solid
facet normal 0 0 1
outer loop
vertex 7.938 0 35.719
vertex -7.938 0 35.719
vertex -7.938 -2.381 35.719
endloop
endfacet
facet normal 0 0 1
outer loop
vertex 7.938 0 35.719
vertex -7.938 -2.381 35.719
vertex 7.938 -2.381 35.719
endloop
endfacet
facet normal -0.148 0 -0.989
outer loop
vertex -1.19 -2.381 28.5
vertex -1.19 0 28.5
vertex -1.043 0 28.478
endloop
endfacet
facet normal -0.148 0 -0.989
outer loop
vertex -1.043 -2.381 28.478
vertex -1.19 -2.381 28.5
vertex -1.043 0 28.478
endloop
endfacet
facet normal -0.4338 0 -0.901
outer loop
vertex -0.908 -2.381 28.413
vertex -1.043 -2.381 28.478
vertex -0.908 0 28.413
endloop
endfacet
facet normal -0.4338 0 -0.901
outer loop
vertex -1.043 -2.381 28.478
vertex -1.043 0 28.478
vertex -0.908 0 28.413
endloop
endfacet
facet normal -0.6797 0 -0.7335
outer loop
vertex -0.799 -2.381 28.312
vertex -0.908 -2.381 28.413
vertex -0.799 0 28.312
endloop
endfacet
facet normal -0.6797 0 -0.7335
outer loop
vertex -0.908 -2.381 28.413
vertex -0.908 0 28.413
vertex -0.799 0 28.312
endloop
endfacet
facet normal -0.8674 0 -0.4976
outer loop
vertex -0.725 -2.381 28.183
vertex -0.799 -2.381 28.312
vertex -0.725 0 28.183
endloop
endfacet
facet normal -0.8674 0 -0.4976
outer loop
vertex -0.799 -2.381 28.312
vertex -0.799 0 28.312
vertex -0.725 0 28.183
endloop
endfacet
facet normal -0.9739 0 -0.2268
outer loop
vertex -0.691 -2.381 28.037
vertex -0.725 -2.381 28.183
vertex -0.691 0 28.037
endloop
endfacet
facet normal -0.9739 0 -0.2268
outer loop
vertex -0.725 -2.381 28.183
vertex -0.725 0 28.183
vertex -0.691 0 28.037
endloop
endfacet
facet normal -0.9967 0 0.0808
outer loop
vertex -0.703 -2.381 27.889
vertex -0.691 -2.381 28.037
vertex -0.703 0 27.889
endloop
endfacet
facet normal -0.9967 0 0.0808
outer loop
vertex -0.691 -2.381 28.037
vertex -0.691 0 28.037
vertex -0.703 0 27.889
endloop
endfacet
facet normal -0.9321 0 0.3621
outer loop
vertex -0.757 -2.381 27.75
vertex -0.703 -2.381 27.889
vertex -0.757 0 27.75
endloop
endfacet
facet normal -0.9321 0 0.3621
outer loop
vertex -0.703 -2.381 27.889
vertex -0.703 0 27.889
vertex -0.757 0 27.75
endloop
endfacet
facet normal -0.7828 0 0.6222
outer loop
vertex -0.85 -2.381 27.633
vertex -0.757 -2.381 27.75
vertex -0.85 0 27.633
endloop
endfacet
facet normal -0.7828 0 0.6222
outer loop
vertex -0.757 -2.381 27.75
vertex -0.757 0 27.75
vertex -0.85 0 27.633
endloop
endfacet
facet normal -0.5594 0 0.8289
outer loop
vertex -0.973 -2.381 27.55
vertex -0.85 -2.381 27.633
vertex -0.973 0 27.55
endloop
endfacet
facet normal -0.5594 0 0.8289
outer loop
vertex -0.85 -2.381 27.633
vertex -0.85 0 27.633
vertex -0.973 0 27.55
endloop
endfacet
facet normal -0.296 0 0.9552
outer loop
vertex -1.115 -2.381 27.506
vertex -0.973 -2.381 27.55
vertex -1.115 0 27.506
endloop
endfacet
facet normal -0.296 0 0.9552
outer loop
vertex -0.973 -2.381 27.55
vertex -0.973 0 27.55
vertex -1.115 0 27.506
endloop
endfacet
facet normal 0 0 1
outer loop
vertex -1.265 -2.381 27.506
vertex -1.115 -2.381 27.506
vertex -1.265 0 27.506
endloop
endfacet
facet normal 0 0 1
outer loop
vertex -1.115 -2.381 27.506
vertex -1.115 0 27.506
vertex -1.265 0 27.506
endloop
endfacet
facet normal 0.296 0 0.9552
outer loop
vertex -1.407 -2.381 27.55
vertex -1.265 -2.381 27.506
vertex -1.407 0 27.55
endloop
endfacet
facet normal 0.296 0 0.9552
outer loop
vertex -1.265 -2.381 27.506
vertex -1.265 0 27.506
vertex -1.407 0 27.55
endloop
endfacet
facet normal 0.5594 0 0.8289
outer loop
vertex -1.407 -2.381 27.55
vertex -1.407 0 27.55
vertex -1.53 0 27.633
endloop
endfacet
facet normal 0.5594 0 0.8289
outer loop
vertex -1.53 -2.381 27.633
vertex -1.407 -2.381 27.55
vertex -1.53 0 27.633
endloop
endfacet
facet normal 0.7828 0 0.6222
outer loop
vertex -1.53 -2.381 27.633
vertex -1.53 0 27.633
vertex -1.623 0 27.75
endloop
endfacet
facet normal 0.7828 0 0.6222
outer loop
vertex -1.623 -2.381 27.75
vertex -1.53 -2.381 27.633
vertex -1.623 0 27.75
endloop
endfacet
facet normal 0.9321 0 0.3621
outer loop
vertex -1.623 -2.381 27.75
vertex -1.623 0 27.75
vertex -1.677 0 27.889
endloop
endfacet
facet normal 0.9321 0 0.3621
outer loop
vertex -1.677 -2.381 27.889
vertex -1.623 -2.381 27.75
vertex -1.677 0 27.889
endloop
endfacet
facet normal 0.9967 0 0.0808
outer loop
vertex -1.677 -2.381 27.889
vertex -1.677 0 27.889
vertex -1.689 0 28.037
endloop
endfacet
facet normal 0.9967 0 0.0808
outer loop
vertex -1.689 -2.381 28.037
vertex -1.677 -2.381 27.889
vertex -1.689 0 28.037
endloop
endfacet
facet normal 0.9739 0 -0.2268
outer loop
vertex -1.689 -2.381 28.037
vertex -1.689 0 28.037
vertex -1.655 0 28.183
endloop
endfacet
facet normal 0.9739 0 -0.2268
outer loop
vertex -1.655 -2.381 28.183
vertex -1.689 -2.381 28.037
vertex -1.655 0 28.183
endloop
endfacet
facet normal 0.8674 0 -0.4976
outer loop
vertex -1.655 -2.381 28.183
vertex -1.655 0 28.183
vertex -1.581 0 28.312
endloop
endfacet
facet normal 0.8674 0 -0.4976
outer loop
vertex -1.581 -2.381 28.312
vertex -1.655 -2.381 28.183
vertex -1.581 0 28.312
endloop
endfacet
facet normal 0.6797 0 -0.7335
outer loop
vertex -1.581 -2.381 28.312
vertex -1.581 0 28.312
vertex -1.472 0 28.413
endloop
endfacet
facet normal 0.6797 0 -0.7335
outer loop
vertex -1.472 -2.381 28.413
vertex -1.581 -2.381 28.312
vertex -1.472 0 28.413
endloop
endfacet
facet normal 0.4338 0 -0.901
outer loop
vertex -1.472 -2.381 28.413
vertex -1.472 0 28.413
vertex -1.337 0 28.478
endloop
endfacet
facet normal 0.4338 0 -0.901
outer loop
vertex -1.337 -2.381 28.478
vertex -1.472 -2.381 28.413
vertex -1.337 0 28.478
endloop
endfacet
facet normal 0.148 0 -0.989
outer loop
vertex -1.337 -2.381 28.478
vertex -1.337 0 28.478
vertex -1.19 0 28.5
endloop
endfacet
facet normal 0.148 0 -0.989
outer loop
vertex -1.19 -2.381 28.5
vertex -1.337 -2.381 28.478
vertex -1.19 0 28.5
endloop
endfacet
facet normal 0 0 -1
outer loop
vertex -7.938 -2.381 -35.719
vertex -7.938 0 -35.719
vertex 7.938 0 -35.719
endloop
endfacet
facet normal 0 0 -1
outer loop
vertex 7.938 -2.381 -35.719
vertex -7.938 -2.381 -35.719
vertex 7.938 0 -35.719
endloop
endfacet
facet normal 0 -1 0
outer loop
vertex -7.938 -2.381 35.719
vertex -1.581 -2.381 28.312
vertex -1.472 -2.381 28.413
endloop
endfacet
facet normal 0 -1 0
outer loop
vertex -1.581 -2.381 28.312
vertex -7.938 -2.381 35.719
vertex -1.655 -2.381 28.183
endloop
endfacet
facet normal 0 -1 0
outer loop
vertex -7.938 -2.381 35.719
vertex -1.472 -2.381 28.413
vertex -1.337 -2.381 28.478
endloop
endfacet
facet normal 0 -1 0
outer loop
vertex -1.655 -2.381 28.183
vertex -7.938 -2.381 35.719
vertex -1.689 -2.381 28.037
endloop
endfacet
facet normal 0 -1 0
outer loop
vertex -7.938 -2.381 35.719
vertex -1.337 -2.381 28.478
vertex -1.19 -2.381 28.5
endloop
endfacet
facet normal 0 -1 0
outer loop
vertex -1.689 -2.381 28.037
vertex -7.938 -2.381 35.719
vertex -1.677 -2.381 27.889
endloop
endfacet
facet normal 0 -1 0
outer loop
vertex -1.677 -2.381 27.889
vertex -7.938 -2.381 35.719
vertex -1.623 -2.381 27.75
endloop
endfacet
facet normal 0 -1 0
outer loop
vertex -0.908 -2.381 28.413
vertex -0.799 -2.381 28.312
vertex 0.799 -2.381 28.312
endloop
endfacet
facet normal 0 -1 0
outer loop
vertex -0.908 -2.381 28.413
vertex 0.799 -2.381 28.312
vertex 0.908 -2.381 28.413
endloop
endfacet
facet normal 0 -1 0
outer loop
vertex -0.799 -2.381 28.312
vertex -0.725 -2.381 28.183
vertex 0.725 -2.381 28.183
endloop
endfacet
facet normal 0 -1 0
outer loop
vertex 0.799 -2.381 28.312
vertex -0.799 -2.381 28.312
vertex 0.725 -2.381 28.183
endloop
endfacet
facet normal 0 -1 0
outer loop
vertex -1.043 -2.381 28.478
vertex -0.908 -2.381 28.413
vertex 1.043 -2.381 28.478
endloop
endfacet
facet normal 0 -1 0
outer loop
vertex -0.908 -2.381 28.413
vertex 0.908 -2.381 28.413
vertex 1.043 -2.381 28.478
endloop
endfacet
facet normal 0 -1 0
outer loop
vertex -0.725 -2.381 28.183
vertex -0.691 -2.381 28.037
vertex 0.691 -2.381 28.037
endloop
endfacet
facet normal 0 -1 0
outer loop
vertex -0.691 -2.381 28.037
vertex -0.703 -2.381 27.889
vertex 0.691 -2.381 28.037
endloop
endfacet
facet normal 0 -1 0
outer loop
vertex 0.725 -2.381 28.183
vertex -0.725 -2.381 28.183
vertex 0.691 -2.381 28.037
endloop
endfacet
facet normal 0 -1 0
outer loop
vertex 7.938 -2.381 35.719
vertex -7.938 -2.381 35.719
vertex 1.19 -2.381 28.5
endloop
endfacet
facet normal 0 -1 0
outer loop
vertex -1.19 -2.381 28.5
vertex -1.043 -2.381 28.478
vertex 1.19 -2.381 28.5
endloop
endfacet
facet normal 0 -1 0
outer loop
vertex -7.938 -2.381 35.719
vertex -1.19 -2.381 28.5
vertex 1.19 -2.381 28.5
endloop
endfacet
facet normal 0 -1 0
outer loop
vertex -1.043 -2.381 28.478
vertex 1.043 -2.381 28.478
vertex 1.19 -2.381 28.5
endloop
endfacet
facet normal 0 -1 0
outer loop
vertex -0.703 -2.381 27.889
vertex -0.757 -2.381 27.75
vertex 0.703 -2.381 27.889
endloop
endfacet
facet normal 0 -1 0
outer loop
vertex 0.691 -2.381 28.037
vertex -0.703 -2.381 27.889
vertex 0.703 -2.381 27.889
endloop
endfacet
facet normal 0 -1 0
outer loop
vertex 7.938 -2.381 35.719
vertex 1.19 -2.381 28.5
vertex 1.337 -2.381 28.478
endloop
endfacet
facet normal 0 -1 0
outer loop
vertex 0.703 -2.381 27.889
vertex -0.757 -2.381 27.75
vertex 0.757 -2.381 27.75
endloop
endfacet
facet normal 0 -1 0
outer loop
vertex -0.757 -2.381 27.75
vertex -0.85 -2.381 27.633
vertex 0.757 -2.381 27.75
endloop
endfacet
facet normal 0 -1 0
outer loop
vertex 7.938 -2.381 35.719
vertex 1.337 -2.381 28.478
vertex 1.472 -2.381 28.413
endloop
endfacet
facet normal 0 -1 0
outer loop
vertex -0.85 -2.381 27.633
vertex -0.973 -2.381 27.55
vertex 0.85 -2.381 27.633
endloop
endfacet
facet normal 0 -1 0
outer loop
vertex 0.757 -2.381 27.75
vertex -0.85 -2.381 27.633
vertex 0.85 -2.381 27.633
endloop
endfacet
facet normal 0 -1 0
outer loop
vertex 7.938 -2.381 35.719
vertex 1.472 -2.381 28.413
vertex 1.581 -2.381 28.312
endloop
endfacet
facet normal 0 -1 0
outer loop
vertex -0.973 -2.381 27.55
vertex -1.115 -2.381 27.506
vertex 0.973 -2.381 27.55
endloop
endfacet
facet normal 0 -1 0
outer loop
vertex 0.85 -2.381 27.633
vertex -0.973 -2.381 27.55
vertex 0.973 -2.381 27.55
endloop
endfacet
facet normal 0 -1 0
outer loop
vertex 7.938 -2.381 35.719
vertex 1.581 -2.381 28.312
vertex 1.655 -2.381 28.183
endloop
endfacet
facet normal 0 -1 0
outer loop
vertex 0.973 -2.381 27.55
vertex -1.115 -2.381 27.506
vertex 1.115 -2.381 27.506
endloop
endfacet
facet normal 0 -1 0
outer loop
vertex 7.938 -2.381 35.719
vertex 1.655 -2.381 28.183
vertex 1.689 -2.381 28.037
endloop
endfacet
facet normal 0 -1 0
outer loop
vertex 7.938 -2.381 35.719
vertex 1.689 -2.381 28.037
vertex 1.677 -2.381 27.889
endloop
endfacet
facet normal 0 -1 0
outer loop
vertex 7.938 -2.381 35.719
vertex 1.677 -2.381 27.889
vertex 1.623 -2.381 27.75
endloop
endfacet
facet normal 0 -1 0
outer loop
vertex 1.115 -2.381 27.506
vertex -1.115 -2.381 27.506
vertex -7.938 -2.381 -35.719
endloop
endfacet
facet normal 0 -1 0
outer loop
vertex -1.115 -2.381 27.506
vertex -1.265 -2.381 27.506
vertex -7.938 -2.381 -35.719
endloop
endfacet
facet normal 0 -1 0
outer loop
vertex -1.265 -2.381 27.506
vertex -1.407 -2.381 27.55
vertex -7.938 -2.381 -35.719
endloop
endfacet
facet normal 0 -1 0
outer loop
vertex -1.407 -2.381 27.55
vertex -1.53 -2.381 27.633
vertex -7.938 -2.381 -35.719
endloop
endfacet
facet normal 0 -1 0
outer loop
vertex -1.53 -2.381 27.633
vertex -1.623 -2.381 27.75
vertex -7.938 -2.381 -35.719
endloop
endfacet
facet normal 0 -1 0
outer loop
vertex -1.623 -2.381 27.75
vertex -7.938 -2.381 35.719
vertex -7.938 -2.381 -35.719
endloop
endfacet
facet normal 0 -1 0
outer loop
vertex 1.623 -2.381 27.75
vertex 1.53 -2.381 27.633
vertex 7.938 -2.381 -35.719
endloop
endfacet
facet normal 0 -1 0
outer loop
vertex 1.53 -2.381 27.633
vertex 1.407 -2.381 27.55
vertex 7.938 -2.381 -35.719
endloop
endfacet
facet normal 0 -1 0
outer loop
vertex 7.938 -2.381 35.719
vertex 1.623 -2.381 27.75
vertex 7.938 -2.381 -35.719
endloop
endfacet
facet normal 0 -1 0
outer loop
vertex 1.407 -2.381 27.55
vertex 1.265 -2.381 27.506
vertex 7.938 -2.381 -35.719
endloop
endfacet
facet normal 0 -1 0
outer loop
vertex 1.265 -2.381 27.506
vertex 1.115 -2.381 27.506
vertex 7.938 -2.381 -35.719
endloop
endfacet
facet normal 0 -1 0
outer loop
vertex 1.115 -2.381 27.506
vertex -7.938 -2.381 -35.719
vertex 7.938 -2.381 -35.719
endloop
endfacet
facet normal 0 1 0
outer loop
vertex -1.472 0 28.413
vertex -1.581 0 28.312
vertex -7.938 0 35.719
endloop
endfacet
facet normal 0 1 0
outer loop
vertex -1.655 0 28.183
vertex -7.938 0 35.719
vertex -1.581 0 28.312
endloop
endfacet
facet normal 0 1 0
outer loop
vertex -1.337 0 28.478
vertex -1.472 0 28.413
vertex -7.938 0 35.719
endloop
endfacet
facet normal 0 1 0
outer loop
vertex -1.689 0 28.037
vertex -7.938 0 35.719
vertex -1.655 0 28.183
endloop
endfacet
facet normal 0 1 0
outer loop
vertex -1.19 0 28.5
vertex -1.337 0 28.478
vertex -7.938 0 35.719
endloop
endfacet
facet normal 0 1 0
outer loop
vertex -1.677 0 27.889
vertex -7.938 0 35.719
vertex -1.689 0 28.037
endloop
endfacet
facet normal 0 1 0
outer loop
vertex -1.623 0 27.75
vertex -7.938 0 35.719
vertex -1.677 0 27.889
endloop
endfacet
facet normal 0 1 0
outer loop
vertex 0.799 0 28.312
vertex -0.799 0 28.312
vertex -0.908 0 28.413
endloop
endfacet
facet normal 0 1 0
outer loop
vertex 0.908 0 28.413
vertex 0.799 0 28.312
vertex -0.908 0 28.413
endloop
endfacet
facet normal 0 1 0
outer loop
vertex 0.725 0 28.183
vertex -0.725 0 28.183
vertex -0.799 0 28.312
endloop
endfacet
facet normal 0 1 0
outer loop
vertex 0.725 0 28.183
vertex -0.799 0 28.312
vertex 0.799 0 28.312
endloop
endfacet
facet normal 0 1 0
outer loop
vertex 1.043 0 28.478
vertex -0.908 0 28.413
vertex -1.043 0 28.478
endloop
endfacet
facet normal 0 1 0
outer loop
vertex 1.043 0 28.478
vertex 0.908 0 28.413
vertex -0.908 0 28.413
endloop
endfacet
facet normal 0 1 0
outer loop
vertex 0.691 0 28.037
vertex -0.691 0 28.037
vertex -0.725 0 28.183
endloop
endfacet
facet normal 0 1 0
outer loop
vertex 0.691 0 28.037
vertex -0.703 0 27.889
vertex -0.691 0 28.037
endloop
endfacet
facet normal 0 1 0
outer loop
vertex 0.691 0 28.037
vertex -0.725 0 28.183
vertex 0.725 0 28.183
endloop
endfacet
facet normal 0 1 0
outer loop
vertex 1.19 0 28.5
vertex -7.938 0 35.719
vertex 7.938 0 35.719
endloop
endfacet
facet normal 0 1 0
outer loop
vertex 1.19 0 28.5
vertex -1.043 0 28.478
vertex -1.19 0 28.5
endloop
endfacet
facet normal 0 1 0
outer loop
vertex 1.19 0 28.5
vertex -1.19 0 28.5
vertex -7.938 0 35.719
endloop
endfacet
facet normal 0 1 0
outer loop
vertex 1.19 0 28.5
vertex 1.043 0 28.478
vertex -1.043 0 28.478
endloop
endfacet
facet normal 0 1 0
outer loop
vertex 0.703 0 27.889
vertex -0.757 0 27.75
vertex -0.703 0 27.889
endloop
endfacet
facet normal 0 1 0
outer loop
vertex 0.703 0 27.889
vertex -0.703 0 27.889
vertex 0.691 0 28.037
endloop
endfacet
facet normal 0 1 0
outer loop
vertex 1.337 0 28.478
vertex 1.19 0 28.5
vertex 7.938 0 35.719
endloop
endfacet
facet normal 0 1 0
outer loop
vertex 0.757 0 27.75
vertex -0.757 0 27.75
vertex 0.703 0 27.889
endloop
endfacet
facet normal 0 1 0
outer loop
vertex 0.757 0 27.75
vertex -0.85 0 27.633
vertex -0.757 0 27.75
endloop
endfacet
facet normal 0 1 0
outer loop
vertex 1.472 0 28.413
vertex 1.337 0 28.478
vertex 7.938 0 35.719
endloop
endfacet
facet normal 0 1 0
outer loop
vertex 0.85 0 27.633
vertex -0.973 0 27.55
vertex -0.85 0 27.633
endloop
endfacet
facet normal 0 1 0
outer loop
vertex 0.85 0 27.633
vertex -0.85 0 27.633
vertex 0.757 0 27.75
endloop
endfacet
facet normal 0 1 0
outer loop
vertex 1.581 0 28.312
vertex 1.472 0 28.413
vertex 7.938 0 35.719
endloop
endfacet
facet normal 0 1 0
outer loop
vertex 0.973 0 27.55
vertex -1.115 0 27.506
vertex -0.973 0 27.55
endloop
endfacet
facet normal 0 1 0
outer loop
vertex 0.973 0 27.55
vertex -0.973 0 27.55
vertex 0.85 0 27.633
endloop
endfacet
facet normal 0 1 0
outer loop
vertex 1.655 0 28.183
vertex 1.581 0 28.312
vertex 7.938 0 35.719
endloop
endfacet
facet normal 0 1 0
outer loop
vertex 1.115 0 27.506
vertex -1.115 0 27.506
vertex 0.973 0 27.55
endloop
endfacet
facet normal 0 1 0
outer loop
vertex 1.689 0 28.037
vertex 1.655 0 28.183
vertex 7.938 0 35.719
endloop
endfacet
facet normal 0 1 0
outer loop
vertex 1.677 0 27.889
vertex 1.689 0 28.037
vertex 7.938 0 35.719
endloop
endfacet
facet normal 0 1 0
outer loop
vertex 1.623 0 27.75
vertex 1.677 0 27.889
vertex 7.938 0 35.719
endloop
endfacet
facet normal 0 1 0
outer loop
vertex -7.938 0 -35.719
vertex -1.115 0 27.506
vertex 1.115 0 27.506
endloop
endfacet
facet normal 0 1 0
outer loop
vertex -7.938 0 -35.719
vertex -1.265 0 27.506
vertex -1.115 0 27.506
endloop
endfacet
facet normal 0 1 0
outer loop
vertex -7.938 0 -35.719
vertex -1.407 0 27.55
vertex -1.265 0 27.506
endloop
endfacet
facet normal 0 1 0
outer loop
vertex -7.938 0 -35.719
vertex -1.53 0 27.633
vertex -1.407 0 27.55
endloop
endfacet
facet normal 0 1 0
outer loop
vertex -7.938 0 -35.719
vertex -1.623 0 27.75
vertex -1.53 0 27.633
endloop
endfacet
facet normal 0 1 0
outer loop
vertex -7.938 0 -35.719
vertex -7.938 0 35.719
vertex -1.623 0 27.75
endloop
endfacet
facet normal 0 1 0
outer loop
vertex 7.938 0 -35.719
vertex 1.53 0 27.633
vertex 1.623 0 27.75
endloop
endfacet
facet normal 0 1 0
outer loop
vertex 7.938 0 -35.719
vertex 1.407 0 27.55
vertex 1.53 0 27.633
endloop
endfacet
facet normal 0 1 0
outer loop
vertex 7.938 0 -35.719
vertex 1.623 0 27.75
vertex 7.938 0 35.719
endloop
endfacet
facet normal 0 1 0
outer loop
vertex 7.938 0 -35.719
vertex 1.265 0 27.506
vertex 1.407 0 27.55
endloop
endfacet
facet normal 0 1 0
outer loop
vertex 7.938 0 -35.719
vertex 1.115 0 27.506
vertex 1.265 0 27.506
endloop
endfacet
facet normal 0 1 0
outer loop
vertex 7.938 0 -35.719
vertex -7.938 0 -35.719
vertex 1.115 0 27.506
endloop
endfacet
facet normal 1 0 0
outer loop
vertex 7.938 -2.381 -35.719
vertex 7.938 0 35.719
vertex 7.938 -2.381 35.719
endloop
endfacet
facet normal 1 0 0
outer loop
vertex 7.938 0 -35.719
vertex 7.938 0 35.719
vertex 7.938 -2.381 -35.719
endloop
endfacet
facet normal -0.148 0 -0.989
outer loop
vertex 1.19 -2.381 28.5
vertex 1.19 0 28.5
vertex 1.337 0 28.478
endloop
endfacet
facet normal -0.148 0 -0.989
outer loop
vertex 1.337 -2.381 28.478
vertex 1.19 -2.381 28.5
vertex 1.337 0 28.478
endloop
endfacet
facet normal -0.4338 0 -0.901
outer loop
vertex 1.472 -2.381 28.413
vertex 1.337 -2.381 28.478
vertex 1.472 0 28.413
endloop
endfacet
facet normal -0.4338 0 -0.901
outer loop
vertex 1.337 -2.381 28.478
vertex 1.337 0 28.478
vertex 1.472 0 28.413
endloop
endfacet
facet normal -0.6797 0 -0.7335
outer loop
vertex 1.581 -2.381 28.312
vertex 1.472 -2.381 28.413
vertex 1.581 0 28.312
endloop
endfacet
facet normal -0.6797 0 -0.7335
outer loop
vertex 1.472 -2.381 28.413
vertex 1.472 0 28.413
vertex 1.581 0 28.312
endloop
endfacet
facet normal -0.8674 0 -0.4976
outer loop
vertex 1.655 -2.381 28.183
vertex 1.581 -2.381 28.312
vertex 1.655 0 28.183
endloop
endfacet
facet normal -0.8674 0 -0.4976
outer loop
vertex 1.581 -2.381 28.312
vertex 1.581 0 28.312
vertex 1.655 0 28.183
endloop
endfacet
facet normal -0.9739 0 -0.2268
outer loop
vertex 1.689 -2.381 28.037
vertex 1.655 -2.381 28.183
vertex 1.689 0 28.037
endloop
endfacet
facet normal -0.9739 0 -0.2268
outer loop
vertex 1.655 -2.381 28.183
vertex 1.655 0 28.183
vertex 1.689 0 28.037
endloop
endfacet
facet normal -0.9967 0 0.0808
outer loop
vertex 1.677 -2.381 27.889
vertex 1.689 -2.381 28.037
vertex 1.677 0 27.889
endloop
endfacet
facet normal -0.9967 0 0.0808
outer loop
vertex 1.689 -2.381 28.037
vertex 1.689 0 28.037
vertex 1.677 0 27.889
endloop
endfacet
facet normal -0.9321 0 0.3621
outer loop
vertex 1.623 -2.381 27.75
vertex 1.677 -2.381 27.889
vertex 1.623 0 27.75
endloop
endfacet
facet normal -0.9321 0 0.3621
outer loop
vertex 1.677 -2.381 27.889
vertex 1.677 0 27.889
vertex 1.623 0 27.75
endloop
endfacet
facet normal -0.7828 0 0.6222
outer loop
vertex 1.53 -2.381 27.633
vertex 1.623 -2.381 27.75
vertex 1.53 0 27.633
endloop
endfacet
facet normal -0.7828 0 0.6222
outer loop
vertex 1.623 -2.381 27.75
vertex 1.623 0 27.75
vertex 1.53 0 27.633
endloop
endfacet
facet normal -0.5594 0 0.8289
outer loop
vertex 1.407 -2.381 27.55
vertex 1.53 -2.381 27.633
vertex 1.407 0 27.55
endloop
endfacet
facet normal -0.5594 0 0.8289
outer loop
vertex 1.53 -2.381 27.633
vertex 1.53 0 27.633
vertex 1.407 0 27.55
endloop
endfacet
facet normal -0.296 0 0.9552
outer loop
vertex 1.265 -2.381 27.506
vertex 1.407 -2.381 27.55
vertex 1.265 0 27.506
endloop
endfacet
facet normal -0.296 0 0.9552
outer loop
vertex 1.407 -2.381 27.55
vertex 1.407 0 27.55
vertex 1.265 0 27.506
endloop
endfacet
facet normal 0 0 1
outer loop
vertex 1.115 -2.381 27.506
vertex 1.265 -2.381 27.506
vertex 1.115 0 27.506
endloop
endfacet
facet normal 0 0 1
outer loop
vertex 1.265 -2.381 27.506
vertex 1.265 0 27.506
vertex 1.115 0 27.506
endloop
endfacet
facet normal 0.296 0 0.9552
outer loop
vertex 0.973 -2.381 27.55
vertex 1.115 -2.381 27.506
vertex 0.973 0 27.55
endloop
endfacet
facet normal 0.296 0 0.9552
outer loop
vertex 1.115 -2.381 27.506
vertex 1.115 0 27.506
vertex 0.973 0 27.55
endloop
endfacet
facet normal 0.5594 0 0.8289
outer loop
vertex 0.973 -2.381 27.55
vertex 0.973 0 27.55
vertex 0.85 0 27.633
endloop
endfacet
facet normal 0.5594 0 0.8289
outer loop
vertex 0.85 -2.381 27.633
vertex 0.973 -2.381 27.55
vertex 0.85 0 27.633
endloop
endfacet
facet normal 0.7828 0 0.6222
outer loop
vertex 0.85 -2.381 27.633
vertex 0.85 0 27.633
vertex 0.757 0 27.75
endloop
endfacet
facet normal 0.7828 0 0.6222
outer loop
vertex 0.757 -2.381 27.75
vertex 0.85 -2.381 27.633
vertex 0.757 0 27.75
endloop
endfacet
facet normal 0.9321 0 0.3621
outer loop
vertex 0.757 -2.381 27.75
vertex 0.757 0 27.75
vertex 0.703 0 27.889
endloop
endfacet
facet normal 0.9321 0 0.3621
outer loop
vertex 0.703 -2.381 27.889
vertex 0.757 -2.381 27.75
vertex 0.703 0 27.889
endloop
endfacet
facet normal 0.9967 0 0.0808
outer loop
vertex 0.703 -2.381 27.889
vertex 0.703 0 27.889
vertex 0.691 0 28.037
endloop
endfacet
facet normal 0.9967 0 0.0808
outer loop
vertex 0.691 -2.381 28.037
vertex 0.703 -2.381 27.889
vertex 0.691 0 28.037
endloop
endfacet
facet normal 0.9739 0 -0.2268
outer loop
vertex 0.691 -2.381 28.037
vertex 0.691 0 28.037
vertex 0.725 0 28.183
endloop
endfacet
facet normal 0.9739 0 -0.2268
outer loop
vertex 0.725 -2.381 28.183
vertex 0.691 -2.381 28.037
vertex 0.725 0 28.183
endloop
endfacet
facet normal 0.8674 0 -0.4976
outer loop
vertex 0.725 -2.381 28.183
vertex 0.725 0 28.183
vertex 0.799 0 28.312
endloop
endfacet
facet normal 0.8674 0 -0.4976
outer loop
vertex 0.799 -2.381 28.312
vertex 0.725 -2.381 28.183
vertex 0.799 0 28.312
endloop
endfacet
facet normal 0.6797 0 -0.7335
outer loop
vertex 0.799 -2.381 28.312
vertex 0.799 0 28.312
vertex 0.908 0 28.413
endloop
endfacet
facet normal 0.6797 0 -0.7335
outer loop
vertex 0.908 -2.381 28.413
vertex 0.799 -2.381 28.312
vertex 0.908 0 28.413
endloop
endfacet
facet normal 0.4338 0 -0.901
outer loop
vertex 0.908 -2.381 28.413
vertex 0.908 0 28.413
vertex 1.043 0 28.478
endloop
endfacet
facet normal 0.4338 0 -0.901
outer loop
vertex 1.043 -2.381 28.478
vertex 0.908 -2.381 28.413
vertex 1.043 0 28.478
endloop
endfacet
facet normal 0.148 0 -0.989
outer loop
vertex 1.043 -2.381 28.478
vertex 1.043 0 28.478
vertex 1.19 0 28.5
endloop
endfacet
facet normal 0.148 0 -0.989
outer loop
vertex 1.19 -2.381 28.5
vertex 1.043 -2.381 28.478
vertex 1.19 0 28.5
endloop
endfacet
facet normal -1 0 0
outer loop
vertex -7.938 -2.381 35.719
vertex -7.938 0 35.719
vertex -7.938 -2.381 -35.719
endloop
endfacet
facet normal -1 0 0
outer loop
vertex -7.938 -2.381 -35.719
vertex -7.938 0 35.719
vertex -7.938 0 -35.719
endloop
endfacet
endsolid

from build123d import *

# Parameters (mm, degrees)
SKETCH1_W          = 15.875
SKETCH1_H          = 71.4375
BASE_FLANGE1_DEPTH = 2.38125
SKETCH2_R          = 0.5
CUT_EXTRUDE1_DEPTH = 37.667470043


# Sheet-metal steps are written as plain solids
with BuildPart() as part:
    # Sketch1 → Base-Flange1 (new body)
    with BuildSketch(Plane(origin=(0, 0, 0), x_dir=(1, 0, 0), z_dir=(0, 1, 0))):
        Rectangle(SKETCH1_W, SKETCH1_H)
    extrude(amount=-BASE_FLANGE1_DEPTH)

    # Sketch2 → Cut-Extrude1 (cut, through all)
    with BuildSketch(Plane(origin=(0, 0, 0), x_dir=(1, 0, 0), z_dir=(0, 1, 0))):
        with Locations(Location((-1.19, -28, 0), (0, 0, 270))):
            Circle(SKETCH2_R)
        with Locations(Location((1.19, -28, 0), (0, 0, 270))):
            Circle(SKETCH2_R)
    extrude(amount=-CUT_EXTRUDE1_DEPTH, mode=Mode.SUBTRACT)


solid = part.part
